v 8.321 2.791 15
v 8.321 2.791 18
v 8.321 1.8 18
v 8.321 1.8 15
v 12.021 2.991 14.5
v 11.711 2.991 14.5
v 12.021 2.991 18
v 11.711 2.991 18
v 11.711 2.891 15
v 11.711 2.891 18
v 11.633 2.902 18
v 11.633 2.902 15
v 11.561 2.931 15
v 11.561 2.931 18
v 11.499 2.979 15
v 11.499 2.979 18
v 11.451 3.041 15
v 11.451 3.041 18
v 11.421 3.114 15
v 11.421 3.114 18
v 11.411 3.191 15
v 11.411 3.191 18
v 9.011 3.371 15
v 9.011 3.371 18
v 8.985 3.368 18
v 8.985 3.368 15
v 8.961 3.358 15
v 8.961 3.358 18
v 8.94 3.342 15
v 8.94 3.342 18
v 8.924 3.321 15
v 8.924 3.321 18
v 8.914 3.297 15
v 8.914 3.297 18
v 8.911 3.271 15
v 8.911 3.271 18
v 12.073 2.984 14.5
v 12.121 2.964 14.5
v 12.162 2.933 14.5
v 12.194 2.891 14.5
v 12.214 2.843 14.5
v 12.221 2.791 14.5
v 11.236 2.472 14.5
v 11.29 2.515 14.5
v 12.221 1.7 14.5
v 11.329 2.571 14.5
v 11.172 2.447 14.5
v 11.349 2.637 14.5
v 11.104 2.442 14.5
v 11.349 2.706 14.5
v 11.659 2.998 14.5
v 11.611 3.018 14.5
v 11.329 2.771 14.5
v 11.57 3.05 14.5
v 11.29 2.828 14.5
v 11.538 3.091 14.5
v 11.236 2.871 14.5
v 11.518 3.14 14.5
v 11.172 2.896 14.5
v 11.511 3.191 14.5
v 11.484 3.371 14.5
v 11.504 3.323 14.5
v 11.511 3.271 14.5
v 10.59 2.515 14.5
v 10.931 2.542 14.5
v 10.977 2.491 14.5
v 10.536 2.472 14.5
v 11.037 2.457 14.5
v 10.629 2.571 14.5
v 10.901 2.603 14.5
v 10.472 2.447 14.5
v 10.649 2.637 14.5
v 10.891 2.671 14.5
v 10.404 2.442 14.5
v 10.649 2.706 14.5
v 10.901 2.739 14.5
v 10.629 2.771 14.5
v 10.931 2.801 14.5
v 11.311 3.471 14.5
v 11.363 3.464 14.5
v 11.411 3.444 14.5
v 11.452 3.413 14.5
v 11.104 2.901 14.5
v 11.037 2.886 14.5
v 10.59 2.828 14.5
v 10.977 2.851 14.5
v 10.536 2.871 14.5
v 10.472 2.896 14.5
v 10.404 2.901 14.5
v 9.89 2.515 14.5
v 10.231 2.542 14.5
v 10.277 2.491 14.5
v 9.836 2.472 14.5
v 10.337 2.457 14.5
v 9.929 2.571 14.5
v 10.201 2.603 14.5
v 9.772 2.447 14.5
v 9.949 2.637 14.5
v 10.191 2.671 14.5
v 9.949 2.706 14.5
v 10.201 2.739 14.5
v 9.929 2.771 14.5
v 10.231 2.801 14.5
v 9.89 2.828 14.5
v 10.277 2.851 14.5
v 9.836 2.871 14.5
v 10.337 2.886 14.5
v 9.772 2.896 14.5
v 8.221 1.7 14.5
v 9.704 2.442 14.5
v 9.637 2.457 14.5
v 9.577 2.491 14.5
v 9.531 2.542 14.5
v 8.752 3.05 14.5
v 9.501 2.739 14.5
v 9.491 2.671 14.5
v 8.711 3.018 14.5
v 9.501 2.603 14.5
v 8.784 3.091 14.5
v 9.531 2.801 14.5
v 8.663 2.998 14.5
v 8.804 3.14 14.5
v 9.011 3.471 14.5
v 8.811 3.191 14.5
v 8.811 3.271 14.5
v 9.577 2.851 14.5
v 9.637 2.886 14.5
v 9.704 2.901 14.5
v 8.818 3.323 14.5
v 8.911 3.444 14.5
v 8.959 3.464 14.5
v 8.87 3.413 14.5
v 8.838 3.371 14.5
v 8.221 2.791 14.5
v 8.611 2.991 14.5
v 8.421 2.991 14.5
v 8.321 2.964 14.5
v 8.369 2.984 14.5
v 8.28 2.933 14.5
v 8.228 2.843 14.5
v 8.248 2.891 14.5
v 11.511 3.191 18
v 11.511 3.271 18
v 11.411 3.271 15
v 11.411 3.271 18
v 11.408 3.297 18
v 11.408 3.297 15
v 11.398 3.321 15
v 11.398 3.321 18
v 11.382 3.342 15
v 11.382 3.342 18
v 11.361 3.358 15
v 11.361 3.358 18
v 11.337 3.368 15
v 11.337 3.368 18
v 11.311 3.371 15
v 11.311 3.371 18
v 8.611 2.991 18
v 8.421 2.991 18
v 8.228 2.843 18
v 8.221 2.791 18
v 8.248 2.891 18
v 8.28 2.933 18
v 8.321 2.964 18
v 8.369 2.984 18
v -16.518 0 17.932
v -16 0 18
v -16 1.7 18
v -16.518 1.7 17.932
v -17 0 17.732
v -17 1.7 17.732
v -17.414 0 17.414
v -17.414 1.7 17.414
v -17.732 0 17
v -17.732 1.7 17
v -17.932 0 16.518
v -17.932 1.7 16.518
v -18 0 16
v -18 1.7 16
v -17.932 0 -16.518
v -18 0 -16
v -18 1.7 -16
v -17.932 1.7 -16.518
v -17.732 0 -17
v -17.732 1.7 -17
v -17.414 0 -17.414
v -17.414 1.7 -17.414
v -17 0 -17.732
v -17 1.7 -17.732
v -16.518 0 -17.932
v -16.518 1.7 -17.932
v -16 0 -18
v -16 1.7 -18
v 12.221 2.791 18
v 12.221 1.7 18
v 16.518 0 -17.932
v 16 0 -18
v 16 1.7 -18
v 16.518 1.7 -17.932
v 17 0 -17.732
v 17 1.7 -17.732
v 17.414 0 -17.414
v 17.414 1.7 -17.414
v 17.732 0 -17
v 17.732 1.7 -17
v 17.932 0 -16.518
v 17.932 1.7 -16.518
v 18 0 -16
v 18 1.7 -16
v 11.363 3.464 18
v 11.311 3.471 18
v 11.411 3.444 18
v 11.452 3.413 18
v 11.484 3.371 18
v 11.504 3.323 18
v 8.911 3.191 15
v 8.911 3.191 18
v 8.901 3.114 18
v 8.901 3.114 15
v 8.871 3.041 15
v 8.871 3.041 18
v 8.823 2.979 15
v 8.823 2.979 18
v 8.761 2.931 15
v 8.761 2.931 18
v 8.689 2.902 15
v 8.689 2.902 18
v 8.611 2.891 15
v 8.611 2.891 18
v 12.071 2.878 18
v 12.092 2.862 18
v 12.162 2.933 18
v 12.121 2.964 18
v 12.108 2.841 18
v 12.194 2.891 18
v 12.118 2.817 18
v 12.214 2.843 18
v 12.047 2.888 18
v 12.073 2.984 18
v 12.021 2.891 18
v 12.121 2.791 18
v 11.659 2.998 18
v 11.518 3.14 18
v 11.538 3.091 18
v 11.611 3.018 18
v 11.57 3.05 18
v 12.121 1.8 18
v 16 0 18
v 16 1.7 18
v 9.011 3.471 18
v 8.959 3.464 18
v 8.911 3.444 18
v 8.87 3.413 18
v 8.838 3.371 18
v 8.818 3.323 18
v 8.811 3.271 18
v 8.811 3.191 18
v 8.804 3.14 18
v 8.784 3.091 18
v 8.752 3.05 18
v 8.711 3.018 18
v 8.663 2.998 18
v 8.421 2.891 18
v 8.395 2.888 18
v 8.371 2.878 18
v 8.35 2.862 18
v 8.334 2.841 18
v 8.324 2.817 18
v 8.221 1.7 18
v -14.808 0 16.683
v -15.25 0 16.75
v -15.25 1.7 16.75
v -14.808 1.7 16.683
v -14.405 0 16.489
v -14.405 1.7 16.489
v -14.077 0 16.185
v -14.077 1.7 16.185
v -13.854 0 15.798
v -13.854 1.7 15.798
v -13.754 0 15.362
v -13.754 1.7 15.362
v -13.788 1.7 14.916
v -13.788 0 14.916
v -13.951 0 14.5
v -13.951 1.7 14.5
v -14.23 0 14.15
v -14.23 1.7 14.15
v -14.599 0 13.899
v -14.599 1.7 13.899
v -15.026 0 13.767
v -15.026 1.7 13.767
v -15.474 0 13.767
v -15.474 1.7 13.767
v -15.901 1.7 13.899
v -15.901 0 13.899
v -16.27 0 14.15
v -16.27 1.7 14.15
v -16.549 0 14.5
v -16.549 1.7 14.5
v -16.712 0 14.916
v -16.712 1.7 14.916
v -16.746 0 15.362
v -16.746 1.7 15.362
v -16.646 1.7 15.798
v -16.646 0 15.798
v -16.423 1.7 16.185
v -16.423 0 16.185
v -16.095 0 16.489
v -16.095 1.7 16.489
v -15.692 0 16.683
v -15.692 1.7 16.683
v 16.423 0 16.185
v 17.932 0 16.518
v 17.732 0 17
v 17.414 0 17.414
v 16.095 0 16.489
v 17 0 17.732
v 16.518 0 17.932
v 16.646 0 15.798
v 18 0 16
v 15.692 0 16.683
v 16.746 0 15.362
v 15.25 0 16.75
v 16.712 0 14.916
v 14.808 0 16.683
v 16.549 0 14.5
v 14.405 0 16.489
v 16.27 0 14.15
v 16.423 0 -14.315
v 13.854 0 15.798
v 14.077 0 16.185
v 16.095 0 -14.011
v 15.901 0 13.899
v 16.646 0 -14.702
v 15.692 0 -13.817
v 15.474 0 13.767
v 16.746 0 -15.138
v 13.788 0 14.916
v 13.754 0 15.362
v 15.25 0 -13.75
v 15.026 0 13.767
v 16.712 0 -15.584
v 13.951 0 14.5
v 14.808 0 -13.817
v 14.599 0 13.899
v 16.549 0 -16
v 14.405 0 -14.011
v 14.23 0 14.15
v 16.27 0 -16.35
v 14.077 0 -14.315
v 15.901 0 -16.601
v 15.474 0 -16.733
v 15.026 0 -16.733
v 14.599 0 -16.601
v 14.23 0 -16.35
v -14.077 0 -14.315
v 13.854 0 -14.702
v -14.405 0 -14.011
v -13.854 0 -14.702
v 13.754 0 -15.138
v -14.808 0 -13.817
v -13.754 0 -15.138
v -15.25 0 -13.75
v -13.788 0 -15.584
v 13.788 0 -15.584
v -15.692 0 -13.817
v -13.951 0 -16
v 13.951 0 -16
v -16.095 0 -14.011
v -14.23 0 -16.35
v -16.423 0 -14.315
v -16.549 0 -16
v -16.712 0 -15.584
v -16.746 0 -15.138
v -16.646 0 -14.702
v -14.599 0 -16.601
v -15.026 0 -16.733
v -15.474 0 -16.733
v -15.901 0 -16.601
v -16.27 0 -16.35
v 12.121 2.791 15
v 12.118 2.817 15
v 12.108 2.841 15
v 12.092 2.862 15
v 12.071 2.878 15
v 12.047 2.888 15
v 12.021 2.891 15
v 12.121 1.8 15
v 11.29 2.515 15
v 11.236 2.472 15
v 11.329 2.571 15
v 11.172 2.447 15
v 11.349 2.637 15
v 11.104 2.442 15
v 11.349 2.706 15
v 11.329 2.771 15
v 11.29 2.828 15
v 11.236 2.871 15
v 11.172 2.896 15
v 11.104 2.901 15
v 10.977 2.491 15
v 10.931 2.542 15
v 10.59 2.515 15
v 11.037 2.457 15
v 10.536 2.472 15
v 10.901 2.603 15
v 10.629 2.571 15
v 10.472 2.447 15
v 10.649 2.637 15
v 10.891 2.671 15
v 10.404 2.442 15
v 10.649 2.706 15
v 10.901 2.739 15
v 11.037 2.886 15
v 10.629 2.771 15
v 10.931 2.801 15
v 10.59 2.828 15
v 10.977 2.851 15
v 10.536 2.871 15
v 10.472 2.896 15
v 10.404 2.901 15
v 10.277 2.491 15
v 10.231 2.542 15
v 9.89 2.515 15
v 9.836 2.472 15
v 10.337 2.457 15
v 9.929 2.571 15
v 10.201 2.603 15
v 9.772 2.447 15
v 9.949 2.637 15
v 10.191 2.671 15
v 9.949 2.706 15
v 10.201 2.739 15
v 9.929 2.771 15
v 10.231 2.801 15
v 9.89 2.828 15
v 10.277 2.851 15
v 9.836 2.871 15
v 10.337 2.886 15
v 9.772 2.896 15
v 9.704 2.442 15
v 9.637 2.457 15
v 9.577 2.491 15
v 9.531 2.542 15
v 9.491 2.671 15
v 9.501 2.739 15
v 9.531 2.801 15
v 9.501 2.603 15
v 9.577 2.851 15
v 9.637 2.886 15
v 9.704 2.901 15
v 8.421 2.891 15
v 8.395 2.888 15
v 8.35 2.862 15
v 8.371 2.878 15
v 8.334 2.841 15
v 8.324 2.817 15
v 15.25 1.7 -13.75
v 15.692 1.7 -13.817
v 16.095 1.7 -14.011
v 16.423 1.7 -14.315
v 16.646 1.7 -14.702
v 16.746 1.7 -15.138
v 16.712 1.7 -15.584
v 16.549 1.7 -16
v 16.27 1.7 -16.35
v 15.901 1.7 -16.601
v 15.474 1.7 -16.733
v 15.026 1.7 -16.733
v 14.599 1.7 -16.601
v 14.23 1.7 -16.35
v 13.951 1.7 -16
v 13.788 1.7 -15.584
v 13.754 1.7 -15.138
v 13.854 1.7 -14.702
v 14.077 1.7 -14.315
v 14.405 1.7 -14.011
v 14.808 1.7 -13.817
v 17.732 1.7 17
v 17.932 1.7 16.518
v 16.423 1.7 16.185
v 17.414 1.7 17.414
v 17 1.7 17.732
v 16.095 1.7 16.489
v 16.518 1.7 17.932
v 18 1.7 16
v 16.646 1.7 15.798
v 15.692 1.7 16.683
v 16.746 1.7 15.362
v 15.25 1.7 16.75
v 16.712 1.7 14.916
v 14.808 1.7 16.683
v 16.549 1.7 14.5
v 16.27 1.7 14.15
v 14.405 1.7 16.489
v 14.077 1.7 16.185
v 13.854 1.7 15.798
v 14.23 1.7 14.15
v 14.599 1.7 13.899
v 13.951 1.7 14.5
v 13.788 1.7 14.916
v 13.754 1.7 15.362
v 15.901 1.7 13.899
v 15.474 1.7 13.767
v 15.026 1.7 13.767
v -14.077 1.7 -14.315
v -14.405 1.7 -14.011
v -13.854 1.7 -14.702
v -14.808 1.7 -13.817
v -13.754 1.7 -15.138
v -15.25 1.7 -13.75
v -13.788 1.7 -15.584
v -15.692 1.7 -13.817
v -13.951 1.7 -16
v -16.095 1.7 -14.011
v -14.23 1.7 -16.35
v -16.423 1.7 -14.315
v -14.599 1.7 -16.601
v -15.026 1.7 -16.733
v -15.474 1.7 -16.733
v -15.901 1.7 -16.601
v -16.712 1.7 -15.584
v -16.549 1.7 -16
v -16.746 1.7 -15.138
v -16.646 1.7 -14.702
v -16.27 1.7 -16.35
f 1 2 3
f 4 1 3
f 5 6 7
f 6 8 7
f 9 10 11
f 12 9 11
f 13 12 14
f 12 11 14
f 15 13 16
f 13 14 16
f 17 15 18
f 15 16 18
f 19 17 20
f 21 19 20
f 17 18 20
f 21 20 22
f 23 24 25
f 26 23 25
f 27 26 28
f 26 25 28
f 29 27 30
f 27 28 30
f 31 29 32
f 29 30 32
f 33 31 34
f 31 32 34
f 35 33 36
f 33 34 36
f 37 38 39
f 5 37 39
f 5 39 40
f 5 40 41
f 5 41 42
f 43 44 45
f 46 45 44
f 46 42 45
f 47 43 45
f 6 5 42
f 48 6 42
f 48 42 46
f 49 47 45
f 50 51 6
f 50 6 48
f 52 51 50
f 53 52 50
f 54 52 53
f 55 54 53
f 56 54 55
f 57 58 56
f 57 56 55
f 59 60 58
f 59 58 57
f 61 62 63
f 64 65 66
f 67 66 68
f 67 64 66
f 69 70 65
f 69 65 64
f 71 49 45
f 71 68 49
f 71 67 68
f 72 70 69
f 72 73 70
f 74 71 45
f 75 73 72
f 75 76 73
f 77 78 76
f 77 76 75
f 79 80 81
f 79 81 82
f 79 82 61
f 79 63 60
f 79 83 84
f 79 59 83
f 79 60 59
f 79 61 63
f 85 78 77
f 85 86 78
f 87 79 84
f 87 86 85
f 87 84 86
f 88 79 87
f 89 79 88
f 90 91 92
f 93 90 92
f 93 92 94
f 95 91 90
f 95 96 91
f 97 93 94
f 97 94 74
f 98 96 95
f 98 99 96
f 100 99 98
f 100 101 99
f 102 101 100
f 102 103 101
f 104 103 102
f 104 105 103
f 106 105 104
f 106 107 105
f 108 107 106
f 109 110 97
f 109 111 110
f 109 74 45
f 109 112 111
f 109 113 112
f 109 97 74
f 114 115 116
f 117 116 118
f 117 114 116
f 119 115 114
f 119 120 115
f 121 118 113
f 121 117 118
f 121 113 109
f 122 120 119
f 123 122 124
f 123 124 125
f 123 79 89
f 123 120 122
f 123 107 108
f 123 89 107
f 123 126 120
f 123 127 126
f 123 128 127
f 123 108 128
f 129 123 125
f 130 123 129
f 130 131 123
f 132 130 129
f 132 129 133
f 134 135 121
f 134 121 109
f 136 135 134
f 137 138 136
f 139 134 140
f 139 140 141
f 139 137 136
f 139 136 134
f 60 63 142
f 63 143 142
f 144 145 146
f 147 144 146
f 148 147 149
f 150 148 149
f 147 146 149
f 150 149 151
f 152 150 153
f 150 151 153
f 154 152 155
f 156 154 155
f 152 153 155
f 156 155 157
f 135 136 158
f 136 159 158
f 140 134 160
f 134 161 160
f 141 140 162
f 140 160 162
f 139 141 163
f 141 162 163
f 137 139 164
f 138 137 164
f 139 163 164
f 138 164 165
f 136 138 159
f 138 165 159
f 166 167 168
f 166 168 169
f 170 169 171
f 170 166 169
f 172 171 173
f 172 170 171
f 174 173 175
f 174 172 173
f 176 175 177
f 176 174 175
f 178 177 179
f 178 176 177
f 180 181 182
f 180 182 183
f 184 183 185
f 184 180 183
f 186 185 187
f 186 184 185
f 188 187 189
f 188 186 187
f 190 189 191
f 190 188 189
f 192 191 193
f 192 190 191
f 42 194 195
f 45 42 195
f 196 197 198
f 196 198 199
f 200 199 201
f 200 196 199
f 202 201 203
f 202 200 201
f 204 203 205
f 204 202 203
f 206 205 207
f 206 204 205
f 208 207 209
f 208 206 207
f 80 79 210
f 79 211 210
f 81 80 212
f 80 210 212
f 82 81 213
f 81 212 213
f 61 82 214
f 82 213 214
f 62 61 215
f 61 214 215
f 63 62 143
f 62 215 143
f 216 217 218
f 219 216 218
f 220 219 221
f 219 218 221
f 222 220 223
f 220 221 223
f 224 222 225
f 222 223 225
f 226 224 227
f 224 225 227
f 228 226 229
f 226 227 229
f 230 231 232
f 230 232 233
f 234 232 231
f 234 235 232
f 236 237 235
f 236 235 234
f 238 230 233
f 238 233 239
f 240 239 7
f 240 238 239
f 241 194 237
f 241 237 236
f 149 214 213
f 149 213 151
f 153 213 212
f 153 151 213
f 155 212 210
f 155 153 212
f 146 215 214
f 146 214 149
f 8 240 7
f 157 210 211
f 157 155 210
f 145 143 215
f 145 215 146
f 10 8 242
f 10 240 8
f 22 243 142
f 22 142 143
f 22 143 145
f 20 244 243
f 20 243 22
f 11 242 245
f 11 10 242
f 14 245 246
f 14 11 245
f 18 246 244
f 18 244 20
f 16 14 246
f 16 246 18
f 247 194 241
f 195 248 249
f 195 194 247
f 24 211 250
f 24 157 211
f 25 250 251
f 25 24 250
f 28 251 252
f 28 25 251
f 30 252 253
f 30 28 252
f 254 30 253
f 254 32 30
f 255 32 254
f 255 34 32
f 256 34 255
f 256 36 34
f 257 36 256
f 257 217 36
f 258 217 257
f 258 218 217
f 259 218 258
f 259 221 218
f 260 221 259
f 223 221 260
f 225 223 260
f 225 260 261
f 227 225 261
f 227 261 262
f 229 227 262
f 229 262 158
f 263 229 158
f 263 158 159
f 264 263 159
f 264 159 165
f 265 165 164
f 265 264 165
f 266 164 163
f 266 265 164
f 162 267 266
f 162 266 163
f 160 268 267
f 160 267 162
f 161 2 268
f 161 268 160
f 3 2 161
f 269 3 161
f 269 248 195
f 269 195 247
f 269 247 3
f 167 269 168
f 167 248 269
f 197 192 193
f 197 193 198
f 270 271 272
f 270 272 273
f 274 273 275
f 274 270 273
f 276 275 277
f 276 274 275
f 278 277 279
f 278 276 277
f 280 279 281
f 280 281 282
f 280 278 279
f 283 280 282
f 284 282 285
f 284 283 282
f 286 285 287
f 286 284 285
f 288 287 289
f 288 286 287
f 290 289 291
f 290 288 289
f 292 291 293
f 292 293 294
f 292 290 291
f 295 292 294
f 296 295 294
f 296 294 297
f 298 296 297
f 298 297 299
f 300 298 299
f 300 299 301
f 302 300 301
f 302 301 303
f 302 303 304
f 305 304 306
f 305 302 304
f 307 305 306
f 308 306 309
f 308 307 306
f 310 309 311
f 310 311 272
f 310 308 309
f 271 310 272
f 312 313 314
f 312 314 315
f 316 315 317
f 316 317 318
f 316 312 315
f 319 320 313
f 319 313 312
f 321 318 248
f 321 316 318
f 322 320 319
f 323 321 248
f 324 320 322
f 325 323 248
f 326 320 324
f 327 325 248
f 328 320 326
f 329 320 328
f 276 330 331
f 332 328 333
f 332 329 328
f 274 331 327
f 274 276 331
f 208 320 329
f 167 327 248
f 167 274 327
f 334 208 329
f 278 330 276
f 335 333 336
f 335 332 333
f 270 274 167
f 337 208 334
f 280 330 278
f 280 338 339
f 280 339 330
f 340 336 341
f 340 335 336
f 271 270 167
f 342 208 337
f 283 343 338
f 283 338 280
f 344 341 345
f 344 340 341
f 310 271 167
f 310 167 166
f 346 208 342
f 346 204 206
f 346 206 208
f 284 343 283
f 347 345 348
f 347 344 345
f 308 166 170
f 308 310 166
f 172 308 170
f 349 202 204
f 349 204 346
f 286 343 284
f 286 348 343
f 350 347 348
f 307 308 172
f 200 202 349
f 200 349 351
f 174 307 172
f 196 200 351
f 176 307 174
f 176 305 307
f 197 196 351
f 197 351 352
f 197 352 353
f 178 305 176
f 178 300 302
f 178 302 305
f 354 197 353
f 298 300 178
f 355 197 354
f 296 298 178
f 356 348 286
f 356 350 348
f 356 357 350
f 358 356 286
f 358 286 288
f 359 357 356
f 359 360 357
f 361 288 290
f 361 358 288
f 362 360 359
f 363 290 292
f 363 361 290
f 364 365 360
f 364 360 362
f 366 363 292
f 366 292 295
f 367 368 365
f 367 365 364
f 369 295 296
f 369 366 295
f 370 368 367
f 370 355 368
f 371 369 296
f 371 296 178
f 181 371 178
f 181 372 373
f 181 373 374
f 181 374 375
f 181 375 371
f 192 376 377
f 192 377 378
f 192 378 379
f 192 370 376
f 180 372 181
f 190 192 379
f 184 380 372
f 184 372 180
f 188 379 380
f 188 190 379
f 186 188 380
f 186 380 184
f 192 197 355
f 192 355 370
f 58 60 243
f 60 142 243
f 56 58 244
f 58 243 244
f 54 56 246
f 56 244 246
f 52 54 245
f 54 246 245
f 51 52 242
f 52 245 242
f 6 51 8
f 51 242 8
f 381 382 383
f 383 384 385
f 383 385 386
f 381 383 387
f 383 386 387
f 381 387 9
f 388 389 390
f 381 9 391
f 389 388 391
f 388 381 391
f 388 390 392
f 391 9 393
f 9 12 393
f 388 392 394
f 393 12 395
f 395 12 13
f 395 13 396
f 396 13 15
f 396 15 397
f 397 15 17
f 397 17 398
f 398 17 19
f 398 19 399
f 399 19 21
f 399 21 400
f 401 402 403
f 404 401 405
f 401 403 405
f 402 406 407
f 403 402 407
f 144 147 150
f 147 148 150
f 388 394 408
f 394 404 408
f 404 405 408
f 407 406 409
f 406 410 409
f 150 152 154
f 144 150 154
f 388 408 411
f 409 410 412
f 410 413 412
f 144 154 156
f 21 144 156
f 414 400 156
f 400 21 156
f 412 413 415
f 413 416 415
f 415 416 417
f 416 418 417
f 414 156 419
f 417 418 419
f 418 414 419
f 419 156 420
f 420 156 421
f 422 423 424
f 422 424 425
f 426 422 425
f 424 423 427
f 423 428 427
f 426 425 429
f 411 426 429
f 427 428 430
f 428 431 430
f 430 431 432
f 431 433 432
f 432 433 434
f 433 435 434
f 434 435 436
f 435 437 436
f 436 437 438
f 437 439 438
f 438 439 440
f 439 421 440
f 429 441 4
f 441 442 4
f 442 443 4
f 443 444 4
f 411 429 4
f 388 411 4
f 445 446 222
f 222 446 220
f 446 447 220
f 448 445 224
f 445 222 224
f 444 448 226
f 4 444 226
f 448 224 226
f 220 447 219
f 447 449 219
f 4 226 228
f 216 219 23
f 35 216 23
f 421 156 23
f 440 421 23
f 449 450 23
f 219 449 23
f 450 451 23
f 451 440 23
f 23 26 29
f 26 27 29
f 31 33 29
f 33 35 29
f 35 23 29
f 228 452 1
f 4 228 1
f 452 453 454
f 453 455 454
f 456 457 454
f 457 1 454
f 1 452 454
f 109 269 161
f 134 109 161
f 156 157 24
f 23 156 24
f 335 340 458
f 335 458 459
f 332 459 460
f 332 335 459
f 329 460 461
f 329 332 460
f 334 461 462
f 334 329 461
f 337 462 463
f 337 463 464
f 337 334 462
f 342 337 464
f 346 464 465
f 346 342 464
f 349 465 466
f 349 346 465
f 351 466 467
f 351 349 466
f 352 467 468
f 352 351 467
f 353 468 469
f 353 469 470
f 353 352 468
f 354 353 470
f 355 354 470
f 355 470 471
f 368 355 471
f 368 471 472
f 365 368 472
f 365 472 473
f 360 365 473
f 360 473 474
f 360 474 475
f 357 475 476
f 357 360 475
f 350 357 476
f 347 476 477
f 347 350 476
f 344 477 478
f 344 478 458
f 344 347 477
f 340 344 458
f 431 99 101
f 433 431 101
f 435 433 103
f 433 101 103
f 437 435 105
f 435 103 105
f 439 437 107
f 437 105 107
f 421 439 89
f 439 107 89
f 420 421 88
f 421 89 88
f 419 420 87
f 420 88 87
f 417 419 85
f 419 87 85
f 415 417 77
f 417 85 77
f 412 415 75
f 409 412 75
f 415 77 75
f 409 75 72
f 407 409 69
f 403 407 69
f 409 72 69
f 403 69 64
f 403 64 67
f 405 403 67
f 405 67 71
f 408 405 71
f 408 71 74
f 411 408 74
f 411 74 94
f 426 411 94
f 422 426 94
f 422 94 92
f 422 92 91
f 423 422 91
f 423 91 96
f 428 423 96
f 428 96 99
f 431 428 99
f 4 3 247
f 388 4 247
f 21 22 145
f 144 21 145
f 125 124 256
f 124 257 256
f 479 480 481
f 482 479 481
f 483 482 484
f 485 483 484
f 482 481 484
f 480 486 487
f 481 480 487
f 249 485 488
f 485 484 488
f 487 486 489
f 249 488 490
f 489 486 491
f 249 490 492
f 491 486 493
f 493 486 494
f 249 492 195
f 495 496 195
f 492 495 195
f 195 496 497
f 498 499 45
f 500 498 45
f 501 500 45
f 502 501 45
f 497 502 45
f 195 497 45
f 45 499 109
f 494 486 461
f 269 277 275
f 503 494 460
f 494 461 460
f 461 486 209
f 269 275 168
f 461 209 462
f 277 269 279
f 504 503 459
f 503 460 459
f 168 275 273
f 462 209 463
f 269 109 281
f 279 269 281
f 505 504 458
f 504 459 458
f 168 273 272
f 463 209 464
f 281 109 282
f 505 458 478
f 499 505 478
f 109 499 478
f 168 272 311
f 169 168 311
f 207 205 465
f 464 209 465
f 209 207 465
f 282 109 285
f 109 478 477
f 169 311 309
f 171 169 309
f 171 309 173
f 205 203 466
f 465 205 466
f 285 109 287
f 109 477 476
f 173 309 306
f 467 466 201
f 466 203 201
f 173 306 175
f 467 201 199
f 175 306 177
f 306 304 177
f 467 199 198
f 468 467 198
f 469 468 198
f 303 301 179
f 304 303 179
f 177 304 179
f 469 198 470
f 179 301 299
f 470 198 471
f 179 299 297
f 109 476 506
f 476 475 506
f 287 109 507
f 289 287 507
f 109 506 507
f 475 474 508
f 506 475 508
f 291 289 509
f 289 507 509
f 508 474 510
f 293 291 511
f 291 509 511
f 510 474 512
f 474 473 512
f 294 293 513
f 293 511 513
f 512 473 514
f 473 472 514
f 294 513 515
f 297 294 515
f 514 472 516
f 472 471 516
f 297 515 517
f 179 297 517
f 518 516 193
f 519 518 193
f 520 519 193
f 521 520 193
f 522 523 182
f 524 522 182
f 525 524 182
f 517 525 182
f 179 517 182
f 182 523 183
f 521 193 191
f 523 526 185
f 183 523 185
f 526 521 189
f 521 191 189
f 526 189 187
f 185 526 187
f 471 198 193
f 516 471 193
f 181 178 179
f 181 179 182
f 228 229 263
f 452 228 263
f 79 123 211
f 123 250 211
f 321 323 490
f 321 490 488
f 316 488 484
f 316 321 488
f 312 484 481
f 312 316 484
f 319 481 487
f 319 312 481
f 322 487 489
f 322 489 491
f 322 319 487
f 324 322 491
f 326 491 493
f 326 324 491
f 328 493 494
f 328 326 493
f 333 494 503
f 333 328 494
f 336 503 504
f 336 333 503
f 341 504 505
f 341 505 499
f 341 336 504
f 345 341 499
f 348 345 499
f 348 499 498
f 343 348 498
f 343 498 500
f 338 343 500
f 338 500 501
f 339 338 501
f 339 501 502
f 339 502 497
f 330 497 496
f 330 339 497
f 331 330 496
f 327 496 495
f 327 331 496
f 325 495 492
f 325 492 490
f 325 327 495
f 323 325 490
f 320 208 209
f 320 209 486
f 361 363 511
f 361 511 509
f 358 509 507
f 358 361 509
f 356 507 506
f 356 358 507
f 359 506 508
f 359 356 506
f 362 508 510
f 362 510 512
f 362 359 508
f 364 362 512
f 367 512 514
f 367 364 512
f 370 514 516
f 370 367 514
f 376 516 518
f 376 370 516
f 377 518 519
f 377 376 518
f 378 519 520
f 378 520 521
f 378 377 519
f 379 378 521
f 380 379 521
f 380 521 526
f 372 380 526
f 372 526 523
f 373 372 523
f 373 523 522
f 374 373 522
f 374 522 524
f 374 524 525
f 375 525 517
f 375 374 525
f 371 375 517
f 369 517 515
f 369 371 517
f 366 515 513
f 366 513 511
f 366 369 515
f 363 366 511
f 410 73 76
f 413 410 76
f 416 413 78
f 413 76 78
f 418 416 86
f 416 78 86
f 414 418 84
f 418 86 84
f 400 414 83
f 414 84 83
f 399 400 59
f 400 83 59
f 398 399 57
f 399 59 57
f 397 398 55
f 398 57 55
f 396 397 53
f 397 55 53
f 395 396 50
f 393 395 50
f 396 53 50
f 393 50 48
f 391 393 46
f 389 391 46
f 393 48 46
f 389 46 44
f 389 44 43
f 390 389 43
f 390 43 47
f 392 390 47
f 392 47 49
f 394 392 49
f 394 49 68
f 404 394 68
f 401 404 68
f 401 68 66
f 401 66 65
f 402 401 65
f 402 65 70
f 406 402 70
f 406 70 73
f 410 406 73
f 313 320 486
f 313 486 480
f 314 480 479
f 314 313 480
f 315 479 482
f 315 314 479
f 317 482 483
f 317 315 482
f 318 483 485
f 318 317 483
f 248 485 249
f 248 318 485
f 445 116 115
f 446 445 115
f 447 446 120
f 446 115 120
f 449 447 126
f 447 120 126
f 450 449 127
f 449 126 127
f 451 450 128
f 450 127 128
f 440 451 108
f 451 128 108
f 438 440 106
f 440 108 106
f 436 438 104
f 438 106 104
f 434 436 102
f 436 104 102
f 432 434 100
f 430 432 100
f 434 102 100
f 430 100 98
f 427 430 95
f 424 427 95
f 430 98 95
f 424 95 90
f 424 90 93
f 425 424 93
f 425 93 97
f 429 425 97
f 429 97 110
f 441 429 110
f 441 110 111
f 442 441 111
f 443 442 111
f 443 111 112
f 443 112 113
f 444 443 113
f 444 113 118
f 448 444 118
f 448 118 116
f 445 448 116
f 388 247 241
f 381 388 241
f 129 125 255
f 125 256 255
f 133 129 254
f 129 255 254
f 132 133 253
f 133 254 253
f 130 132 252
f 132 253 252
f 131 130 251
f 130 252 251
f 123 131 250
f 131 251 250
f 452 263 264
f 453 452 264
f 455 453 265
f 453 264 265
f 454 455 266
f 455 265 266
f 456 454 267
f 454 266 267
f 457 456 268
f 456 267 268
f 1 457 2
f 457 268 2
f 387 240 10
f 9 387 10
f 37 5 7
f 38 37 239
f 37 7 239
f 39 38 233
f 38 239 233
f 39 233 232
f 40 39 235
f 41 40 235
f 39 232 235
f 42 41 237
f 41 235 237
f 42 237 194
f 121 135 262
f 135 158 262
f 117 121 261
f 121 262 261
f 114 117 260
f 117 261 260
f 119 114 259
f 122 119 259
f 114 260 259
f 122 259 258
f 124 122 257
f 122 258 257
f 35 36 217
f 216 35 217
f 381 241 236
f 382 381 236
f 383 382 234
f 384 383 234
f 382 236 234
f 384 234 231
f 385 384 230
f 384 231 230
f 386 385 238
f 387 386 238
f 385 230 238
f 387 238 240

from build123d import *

# Parameters (mm, degrees)
SKETCH1_R           = 1.5
BOSS_EXTRUDE1_DEPTH = 1.7
BOSS_EXTRUDE2_DEPTH = 3
BOSS_EXTRUDE3_DEPTH = 0.5
CUT_EXTRUDE2_REACH  = 39.314
SKETCH4_R           = 0.230396576


with BuildPart() as part:
    # Sketch1 → Boss-Extrude1 (new body)
    with BuildSketch(Plane(origin=(0, 0, 0), x_dir=(1, 0, 0), z_dir=(0, 1, 0))):
        with BuildLine():
            Line((-16, 18), (16, 18))
            ThreePointArc((16, 18), (17.414213562, 17.414213562), (18, 16))
            Line((18, 16), (18, -16))
            ThreePointArc((18, -16), (17.414213562, -17.414213562), (16, -18))
            Line((16, -18), (-16, -18))
            ThreePointArc((-16, -18), (-17.414213562, -17.414213562), (-18, -16))
            Line((-18, -16), (-18, 16))
            ThreePointArc((-18, 16), (-17.414213562, 17.414213562), (-16, 18))
        make_face()
        with Locations(Location((-15.25, 15.25, 0), (0, 0, 270))):
            Circle(SKETCH1_R, mode=Mode.SUBTRACT)
        with Locations(Location((15.25, 15.25, 0), (0, 0, 270))):
            Circle(SKETCH1_R, mode=Mode.SUBTRACT)
        with Locations(Location((-15.25, -15.25, 0), (0, 0, 270))):
            Circle(SKETCH1_R, mode=Mode.SUBTRACT)
        with Locations(Location((15.25, -15.25, 0), (0, 0, 270))):
            Circle(SKETCH1_R, mode=Mode.SUBTRACT)
    extrude(amount=BOSS_EXTRUDE1_DEPTH)

    # Sketch2 → Boss-Extrude2 (add)
    with BuildSketch(Plane.XY.offset(18)):
        with BuildLine():
            Line((8.220977072, 1.7), (12.220977072, 1.7))
            Line((12.220977072, 1.7), (12.220977072, 2.791290101))
            ThreePointArc((12.220977072, 2.791290101), (12.162398428, 2.932711457), (12.020977072, 2.991290101))
            Line((12.020977072, 2.991290101), (11.710977072, 2.991290101))
            ThreePointArc((11.710977072, 2.991290101), (11.569555715, 3.049868744), (11.510977072, 3.191290101))
            Line((11.510977072, 3.191290101), (11.510977072, 3.271290101))
            ThreePointArc((11.510977072, 3.271290101), (11.452398428, 3.412711457), (11.310977072, 3.471290101))
            Line((11.310977072, 3.471290101), (9.010977072, 3.471290101))
            ThreePointArc((9.010977072, 3.471290101), (8.869555715, 3.412711457), (8.810977072, 3.271290101))
            Line((8.810977072, 3.271290101), (8.810977072, 3.191290101))
            ThreePointArc((8.810977072, 3.191290101), (8.752398428, 3.049868744), (8.610977072, 2.991290101))
            Line((8.610977072, 2.991290101), (8.420977072, 2.991290101))
            ThreePointArc((8.420977072, 2.991290101), (8.279555715, 2.932711457), (8.220977072, 2.791290101))
            Line((8.220977072, 2.791290101), (8.220977072, 1.7))
        make_face()
        with BuildLine():
            Line((8.320977072, 1.8), (12.120977072, 1.8))
            Line((12.120977072, 1.8), (12.120977072, 2.791290101))
            ThreePointArc((12.120977072, 2.791290101), (12.09168775, 2.862000779), (12.020977072, 2.891290101))
            Line((12.020977072, 2.891290101), (11.710977072, 2.891290101))
            ThreePointArc((11.710977072, 2.891290101), (11.498845037, 2.979158066), (11.410977072, 3.191290101))
            Line((11.410977072, 3.191290101), (11.410977072, 3.271290101))
            ThreePointArc((11.410977072, 3.271290101), (11.38168775, 3.342000779), (11.310977072, 3.371290101))
            Line((11.310977072, 3.371290101), (9.010977072, 3.371290101))
            ThreePointArc((9.010977072, 3.371290101), (8.940266393, 3.342000779), (8.910977072, 3.271290101))
            Line((8.910977072, 3.271290101), (8.910977072, 3.191290101))
            ThreePointArc((8.910977072, 3.191290101), (8.823109106, 2.979158066), (8.610977072, 2.891290101))
            Line((8.610977072, 2.891290101), (8.420977072, 2.891290101))
            ThreePointArc((8.420977072, 2.891290101), (8.350266393, 2.862000779), (8.320977072, 2.791290101))
            Line((8.320977072, 2.791290101), (8.320977072, 1.8))
        make_face(mode=Mode.SUBTRACT)
    extrude(amount=-BOSS_EXTRUDE2_DEPTH)

    # Sketch3 → Boss-Extrude3 (add)
    with BuildSketch(Plane(origin=(0, 0, 15), x_dir=(-1, 0, 0), z_dir=(0, 0, -1))):
        with BuildLine():
            Line((-8.220977072, 1.7), (-8.220977072, 2.791290101))
            ThreePointArc((-8.220977072, 2.791290101), (-8.279555715, 2.932711457), (-8.420977072, 2.991290101))
            Line((-8.420977072, 2.991290101), (-8.610977072, 2.991290101))
            ThreePointArc((-8.610977072, 2.991290101), (-8.752398428, 3.049868744), (-8.810977072, 3.191290101))
            Line((-8.810977072, 3.191290101), (-8.810977072, 3.271290101))
            ThreePointArc((-8.810977072, 3.271290101), (-8.869555715, 3.412711457), (-9.010977072, 3.471290101))
            Line((-9.010977072, 3.471290101), (-11.310977072, 3.471290101))
            ThreePointArc((-11.310977072, 3.471290101), (-11.452398428, 3.412711457), (-11.510977072, 3.271290101))
            Line((-11.510977072, 3.271290101), (-11.510977072, 3.191290101))
            ThreePointArc((-11.510977072, 3.191290101), (-11.569555715, 3.049868744), (-11.710977072, 2.991290101))
            Line((-11.710977072, 2.991290101), (-12.020977072, 2.991290101))
            ThreePointArc((-12.020977072, 2.991290101), (-12.162398428, 2.932711457), (-12.220977072, 2.791290101))
            Line((-12.220977072, 2.791290101), (-12.220977072, 1.7))
            Line((-12.220977072, 1.7), (-8.220977072, 1.7))
        make_face()
    extrude(amount=BOSS_EXTRUDE3_DEPTH)

    # Sketch4 → Cut-Extrude2 (cut, up to next)
    with BuildSketch(Plane(origin=(0, 0, 14.5), x_dir=(-1, 0, 0), z_dir=(0, 0, -1)), mode=Mode.PRIVATE) as cut_extrude2_sk1:
        with Locations((-11.120977072, 2.671290101)):
            Circle(SKETCH4_R)
    cut_extrude2_tool1 = extrude(cut_extrude2_sk1.sketch, amount=-CUT_EXTRUDE2_REACH, mode=Mode.PRIVATE) & part.part
    # Sketch4 → Cut-Extrude2 (cut, up to next)
    with BuildSketch(Plane(origin=(0, 0, 14.5), x_dir=(-1, 0, 0), z_dir=(0, 0, -1)), mode=Mode.PRIVATE) as cut_extrude2_sk2:
        with Locations((-10.420977072, 2.671290101)):
            Circle(SKETCH4_R)
    cut_extrude2_tool2 = extrude(cut_extrude2_sk2.sketch, amount=-CUT_EXTRUDE2_REACH, mode=Mode.PRIVATE) & part.part
    # Sketch4 → Cut-Extrude2 (cut, up to next)
    with BuildSketch(Plane(origin=(0, 0, 14.5), x_dir=(-1, 0, 0), z_dir=(0, 0, -1)), mode=Mode.PRIVATE) as cut_extrude2_sk3:
        with Locations((-9.720977072, 2.671290101)):
            Circle(SKETCH4_R)
    cut_extrude2_tool3 = extrude(cut_extrude2_sk3.sketch, amount=-CUT_EXTRUDE2_REACH, mode=Mode.PRIVATE) & part.part
    add(cut_extrude2_tool1.solids().sort_by_distance((11.120977, 2.67129, 14.5))[0], mode=Mode.SUBTRACT)
    add(cut_extrude2_tool2.solids().sort_by_distance((10.420977, 2.67129, 14.5))[0], mode=Mode.SUBTRACT)
    add(cut_extrude2_tool3.solids().sort_by_distance((9.720977, 2.67129, 14.5))[0], mode=Mode.SUBTRACT)


solid = part.part
